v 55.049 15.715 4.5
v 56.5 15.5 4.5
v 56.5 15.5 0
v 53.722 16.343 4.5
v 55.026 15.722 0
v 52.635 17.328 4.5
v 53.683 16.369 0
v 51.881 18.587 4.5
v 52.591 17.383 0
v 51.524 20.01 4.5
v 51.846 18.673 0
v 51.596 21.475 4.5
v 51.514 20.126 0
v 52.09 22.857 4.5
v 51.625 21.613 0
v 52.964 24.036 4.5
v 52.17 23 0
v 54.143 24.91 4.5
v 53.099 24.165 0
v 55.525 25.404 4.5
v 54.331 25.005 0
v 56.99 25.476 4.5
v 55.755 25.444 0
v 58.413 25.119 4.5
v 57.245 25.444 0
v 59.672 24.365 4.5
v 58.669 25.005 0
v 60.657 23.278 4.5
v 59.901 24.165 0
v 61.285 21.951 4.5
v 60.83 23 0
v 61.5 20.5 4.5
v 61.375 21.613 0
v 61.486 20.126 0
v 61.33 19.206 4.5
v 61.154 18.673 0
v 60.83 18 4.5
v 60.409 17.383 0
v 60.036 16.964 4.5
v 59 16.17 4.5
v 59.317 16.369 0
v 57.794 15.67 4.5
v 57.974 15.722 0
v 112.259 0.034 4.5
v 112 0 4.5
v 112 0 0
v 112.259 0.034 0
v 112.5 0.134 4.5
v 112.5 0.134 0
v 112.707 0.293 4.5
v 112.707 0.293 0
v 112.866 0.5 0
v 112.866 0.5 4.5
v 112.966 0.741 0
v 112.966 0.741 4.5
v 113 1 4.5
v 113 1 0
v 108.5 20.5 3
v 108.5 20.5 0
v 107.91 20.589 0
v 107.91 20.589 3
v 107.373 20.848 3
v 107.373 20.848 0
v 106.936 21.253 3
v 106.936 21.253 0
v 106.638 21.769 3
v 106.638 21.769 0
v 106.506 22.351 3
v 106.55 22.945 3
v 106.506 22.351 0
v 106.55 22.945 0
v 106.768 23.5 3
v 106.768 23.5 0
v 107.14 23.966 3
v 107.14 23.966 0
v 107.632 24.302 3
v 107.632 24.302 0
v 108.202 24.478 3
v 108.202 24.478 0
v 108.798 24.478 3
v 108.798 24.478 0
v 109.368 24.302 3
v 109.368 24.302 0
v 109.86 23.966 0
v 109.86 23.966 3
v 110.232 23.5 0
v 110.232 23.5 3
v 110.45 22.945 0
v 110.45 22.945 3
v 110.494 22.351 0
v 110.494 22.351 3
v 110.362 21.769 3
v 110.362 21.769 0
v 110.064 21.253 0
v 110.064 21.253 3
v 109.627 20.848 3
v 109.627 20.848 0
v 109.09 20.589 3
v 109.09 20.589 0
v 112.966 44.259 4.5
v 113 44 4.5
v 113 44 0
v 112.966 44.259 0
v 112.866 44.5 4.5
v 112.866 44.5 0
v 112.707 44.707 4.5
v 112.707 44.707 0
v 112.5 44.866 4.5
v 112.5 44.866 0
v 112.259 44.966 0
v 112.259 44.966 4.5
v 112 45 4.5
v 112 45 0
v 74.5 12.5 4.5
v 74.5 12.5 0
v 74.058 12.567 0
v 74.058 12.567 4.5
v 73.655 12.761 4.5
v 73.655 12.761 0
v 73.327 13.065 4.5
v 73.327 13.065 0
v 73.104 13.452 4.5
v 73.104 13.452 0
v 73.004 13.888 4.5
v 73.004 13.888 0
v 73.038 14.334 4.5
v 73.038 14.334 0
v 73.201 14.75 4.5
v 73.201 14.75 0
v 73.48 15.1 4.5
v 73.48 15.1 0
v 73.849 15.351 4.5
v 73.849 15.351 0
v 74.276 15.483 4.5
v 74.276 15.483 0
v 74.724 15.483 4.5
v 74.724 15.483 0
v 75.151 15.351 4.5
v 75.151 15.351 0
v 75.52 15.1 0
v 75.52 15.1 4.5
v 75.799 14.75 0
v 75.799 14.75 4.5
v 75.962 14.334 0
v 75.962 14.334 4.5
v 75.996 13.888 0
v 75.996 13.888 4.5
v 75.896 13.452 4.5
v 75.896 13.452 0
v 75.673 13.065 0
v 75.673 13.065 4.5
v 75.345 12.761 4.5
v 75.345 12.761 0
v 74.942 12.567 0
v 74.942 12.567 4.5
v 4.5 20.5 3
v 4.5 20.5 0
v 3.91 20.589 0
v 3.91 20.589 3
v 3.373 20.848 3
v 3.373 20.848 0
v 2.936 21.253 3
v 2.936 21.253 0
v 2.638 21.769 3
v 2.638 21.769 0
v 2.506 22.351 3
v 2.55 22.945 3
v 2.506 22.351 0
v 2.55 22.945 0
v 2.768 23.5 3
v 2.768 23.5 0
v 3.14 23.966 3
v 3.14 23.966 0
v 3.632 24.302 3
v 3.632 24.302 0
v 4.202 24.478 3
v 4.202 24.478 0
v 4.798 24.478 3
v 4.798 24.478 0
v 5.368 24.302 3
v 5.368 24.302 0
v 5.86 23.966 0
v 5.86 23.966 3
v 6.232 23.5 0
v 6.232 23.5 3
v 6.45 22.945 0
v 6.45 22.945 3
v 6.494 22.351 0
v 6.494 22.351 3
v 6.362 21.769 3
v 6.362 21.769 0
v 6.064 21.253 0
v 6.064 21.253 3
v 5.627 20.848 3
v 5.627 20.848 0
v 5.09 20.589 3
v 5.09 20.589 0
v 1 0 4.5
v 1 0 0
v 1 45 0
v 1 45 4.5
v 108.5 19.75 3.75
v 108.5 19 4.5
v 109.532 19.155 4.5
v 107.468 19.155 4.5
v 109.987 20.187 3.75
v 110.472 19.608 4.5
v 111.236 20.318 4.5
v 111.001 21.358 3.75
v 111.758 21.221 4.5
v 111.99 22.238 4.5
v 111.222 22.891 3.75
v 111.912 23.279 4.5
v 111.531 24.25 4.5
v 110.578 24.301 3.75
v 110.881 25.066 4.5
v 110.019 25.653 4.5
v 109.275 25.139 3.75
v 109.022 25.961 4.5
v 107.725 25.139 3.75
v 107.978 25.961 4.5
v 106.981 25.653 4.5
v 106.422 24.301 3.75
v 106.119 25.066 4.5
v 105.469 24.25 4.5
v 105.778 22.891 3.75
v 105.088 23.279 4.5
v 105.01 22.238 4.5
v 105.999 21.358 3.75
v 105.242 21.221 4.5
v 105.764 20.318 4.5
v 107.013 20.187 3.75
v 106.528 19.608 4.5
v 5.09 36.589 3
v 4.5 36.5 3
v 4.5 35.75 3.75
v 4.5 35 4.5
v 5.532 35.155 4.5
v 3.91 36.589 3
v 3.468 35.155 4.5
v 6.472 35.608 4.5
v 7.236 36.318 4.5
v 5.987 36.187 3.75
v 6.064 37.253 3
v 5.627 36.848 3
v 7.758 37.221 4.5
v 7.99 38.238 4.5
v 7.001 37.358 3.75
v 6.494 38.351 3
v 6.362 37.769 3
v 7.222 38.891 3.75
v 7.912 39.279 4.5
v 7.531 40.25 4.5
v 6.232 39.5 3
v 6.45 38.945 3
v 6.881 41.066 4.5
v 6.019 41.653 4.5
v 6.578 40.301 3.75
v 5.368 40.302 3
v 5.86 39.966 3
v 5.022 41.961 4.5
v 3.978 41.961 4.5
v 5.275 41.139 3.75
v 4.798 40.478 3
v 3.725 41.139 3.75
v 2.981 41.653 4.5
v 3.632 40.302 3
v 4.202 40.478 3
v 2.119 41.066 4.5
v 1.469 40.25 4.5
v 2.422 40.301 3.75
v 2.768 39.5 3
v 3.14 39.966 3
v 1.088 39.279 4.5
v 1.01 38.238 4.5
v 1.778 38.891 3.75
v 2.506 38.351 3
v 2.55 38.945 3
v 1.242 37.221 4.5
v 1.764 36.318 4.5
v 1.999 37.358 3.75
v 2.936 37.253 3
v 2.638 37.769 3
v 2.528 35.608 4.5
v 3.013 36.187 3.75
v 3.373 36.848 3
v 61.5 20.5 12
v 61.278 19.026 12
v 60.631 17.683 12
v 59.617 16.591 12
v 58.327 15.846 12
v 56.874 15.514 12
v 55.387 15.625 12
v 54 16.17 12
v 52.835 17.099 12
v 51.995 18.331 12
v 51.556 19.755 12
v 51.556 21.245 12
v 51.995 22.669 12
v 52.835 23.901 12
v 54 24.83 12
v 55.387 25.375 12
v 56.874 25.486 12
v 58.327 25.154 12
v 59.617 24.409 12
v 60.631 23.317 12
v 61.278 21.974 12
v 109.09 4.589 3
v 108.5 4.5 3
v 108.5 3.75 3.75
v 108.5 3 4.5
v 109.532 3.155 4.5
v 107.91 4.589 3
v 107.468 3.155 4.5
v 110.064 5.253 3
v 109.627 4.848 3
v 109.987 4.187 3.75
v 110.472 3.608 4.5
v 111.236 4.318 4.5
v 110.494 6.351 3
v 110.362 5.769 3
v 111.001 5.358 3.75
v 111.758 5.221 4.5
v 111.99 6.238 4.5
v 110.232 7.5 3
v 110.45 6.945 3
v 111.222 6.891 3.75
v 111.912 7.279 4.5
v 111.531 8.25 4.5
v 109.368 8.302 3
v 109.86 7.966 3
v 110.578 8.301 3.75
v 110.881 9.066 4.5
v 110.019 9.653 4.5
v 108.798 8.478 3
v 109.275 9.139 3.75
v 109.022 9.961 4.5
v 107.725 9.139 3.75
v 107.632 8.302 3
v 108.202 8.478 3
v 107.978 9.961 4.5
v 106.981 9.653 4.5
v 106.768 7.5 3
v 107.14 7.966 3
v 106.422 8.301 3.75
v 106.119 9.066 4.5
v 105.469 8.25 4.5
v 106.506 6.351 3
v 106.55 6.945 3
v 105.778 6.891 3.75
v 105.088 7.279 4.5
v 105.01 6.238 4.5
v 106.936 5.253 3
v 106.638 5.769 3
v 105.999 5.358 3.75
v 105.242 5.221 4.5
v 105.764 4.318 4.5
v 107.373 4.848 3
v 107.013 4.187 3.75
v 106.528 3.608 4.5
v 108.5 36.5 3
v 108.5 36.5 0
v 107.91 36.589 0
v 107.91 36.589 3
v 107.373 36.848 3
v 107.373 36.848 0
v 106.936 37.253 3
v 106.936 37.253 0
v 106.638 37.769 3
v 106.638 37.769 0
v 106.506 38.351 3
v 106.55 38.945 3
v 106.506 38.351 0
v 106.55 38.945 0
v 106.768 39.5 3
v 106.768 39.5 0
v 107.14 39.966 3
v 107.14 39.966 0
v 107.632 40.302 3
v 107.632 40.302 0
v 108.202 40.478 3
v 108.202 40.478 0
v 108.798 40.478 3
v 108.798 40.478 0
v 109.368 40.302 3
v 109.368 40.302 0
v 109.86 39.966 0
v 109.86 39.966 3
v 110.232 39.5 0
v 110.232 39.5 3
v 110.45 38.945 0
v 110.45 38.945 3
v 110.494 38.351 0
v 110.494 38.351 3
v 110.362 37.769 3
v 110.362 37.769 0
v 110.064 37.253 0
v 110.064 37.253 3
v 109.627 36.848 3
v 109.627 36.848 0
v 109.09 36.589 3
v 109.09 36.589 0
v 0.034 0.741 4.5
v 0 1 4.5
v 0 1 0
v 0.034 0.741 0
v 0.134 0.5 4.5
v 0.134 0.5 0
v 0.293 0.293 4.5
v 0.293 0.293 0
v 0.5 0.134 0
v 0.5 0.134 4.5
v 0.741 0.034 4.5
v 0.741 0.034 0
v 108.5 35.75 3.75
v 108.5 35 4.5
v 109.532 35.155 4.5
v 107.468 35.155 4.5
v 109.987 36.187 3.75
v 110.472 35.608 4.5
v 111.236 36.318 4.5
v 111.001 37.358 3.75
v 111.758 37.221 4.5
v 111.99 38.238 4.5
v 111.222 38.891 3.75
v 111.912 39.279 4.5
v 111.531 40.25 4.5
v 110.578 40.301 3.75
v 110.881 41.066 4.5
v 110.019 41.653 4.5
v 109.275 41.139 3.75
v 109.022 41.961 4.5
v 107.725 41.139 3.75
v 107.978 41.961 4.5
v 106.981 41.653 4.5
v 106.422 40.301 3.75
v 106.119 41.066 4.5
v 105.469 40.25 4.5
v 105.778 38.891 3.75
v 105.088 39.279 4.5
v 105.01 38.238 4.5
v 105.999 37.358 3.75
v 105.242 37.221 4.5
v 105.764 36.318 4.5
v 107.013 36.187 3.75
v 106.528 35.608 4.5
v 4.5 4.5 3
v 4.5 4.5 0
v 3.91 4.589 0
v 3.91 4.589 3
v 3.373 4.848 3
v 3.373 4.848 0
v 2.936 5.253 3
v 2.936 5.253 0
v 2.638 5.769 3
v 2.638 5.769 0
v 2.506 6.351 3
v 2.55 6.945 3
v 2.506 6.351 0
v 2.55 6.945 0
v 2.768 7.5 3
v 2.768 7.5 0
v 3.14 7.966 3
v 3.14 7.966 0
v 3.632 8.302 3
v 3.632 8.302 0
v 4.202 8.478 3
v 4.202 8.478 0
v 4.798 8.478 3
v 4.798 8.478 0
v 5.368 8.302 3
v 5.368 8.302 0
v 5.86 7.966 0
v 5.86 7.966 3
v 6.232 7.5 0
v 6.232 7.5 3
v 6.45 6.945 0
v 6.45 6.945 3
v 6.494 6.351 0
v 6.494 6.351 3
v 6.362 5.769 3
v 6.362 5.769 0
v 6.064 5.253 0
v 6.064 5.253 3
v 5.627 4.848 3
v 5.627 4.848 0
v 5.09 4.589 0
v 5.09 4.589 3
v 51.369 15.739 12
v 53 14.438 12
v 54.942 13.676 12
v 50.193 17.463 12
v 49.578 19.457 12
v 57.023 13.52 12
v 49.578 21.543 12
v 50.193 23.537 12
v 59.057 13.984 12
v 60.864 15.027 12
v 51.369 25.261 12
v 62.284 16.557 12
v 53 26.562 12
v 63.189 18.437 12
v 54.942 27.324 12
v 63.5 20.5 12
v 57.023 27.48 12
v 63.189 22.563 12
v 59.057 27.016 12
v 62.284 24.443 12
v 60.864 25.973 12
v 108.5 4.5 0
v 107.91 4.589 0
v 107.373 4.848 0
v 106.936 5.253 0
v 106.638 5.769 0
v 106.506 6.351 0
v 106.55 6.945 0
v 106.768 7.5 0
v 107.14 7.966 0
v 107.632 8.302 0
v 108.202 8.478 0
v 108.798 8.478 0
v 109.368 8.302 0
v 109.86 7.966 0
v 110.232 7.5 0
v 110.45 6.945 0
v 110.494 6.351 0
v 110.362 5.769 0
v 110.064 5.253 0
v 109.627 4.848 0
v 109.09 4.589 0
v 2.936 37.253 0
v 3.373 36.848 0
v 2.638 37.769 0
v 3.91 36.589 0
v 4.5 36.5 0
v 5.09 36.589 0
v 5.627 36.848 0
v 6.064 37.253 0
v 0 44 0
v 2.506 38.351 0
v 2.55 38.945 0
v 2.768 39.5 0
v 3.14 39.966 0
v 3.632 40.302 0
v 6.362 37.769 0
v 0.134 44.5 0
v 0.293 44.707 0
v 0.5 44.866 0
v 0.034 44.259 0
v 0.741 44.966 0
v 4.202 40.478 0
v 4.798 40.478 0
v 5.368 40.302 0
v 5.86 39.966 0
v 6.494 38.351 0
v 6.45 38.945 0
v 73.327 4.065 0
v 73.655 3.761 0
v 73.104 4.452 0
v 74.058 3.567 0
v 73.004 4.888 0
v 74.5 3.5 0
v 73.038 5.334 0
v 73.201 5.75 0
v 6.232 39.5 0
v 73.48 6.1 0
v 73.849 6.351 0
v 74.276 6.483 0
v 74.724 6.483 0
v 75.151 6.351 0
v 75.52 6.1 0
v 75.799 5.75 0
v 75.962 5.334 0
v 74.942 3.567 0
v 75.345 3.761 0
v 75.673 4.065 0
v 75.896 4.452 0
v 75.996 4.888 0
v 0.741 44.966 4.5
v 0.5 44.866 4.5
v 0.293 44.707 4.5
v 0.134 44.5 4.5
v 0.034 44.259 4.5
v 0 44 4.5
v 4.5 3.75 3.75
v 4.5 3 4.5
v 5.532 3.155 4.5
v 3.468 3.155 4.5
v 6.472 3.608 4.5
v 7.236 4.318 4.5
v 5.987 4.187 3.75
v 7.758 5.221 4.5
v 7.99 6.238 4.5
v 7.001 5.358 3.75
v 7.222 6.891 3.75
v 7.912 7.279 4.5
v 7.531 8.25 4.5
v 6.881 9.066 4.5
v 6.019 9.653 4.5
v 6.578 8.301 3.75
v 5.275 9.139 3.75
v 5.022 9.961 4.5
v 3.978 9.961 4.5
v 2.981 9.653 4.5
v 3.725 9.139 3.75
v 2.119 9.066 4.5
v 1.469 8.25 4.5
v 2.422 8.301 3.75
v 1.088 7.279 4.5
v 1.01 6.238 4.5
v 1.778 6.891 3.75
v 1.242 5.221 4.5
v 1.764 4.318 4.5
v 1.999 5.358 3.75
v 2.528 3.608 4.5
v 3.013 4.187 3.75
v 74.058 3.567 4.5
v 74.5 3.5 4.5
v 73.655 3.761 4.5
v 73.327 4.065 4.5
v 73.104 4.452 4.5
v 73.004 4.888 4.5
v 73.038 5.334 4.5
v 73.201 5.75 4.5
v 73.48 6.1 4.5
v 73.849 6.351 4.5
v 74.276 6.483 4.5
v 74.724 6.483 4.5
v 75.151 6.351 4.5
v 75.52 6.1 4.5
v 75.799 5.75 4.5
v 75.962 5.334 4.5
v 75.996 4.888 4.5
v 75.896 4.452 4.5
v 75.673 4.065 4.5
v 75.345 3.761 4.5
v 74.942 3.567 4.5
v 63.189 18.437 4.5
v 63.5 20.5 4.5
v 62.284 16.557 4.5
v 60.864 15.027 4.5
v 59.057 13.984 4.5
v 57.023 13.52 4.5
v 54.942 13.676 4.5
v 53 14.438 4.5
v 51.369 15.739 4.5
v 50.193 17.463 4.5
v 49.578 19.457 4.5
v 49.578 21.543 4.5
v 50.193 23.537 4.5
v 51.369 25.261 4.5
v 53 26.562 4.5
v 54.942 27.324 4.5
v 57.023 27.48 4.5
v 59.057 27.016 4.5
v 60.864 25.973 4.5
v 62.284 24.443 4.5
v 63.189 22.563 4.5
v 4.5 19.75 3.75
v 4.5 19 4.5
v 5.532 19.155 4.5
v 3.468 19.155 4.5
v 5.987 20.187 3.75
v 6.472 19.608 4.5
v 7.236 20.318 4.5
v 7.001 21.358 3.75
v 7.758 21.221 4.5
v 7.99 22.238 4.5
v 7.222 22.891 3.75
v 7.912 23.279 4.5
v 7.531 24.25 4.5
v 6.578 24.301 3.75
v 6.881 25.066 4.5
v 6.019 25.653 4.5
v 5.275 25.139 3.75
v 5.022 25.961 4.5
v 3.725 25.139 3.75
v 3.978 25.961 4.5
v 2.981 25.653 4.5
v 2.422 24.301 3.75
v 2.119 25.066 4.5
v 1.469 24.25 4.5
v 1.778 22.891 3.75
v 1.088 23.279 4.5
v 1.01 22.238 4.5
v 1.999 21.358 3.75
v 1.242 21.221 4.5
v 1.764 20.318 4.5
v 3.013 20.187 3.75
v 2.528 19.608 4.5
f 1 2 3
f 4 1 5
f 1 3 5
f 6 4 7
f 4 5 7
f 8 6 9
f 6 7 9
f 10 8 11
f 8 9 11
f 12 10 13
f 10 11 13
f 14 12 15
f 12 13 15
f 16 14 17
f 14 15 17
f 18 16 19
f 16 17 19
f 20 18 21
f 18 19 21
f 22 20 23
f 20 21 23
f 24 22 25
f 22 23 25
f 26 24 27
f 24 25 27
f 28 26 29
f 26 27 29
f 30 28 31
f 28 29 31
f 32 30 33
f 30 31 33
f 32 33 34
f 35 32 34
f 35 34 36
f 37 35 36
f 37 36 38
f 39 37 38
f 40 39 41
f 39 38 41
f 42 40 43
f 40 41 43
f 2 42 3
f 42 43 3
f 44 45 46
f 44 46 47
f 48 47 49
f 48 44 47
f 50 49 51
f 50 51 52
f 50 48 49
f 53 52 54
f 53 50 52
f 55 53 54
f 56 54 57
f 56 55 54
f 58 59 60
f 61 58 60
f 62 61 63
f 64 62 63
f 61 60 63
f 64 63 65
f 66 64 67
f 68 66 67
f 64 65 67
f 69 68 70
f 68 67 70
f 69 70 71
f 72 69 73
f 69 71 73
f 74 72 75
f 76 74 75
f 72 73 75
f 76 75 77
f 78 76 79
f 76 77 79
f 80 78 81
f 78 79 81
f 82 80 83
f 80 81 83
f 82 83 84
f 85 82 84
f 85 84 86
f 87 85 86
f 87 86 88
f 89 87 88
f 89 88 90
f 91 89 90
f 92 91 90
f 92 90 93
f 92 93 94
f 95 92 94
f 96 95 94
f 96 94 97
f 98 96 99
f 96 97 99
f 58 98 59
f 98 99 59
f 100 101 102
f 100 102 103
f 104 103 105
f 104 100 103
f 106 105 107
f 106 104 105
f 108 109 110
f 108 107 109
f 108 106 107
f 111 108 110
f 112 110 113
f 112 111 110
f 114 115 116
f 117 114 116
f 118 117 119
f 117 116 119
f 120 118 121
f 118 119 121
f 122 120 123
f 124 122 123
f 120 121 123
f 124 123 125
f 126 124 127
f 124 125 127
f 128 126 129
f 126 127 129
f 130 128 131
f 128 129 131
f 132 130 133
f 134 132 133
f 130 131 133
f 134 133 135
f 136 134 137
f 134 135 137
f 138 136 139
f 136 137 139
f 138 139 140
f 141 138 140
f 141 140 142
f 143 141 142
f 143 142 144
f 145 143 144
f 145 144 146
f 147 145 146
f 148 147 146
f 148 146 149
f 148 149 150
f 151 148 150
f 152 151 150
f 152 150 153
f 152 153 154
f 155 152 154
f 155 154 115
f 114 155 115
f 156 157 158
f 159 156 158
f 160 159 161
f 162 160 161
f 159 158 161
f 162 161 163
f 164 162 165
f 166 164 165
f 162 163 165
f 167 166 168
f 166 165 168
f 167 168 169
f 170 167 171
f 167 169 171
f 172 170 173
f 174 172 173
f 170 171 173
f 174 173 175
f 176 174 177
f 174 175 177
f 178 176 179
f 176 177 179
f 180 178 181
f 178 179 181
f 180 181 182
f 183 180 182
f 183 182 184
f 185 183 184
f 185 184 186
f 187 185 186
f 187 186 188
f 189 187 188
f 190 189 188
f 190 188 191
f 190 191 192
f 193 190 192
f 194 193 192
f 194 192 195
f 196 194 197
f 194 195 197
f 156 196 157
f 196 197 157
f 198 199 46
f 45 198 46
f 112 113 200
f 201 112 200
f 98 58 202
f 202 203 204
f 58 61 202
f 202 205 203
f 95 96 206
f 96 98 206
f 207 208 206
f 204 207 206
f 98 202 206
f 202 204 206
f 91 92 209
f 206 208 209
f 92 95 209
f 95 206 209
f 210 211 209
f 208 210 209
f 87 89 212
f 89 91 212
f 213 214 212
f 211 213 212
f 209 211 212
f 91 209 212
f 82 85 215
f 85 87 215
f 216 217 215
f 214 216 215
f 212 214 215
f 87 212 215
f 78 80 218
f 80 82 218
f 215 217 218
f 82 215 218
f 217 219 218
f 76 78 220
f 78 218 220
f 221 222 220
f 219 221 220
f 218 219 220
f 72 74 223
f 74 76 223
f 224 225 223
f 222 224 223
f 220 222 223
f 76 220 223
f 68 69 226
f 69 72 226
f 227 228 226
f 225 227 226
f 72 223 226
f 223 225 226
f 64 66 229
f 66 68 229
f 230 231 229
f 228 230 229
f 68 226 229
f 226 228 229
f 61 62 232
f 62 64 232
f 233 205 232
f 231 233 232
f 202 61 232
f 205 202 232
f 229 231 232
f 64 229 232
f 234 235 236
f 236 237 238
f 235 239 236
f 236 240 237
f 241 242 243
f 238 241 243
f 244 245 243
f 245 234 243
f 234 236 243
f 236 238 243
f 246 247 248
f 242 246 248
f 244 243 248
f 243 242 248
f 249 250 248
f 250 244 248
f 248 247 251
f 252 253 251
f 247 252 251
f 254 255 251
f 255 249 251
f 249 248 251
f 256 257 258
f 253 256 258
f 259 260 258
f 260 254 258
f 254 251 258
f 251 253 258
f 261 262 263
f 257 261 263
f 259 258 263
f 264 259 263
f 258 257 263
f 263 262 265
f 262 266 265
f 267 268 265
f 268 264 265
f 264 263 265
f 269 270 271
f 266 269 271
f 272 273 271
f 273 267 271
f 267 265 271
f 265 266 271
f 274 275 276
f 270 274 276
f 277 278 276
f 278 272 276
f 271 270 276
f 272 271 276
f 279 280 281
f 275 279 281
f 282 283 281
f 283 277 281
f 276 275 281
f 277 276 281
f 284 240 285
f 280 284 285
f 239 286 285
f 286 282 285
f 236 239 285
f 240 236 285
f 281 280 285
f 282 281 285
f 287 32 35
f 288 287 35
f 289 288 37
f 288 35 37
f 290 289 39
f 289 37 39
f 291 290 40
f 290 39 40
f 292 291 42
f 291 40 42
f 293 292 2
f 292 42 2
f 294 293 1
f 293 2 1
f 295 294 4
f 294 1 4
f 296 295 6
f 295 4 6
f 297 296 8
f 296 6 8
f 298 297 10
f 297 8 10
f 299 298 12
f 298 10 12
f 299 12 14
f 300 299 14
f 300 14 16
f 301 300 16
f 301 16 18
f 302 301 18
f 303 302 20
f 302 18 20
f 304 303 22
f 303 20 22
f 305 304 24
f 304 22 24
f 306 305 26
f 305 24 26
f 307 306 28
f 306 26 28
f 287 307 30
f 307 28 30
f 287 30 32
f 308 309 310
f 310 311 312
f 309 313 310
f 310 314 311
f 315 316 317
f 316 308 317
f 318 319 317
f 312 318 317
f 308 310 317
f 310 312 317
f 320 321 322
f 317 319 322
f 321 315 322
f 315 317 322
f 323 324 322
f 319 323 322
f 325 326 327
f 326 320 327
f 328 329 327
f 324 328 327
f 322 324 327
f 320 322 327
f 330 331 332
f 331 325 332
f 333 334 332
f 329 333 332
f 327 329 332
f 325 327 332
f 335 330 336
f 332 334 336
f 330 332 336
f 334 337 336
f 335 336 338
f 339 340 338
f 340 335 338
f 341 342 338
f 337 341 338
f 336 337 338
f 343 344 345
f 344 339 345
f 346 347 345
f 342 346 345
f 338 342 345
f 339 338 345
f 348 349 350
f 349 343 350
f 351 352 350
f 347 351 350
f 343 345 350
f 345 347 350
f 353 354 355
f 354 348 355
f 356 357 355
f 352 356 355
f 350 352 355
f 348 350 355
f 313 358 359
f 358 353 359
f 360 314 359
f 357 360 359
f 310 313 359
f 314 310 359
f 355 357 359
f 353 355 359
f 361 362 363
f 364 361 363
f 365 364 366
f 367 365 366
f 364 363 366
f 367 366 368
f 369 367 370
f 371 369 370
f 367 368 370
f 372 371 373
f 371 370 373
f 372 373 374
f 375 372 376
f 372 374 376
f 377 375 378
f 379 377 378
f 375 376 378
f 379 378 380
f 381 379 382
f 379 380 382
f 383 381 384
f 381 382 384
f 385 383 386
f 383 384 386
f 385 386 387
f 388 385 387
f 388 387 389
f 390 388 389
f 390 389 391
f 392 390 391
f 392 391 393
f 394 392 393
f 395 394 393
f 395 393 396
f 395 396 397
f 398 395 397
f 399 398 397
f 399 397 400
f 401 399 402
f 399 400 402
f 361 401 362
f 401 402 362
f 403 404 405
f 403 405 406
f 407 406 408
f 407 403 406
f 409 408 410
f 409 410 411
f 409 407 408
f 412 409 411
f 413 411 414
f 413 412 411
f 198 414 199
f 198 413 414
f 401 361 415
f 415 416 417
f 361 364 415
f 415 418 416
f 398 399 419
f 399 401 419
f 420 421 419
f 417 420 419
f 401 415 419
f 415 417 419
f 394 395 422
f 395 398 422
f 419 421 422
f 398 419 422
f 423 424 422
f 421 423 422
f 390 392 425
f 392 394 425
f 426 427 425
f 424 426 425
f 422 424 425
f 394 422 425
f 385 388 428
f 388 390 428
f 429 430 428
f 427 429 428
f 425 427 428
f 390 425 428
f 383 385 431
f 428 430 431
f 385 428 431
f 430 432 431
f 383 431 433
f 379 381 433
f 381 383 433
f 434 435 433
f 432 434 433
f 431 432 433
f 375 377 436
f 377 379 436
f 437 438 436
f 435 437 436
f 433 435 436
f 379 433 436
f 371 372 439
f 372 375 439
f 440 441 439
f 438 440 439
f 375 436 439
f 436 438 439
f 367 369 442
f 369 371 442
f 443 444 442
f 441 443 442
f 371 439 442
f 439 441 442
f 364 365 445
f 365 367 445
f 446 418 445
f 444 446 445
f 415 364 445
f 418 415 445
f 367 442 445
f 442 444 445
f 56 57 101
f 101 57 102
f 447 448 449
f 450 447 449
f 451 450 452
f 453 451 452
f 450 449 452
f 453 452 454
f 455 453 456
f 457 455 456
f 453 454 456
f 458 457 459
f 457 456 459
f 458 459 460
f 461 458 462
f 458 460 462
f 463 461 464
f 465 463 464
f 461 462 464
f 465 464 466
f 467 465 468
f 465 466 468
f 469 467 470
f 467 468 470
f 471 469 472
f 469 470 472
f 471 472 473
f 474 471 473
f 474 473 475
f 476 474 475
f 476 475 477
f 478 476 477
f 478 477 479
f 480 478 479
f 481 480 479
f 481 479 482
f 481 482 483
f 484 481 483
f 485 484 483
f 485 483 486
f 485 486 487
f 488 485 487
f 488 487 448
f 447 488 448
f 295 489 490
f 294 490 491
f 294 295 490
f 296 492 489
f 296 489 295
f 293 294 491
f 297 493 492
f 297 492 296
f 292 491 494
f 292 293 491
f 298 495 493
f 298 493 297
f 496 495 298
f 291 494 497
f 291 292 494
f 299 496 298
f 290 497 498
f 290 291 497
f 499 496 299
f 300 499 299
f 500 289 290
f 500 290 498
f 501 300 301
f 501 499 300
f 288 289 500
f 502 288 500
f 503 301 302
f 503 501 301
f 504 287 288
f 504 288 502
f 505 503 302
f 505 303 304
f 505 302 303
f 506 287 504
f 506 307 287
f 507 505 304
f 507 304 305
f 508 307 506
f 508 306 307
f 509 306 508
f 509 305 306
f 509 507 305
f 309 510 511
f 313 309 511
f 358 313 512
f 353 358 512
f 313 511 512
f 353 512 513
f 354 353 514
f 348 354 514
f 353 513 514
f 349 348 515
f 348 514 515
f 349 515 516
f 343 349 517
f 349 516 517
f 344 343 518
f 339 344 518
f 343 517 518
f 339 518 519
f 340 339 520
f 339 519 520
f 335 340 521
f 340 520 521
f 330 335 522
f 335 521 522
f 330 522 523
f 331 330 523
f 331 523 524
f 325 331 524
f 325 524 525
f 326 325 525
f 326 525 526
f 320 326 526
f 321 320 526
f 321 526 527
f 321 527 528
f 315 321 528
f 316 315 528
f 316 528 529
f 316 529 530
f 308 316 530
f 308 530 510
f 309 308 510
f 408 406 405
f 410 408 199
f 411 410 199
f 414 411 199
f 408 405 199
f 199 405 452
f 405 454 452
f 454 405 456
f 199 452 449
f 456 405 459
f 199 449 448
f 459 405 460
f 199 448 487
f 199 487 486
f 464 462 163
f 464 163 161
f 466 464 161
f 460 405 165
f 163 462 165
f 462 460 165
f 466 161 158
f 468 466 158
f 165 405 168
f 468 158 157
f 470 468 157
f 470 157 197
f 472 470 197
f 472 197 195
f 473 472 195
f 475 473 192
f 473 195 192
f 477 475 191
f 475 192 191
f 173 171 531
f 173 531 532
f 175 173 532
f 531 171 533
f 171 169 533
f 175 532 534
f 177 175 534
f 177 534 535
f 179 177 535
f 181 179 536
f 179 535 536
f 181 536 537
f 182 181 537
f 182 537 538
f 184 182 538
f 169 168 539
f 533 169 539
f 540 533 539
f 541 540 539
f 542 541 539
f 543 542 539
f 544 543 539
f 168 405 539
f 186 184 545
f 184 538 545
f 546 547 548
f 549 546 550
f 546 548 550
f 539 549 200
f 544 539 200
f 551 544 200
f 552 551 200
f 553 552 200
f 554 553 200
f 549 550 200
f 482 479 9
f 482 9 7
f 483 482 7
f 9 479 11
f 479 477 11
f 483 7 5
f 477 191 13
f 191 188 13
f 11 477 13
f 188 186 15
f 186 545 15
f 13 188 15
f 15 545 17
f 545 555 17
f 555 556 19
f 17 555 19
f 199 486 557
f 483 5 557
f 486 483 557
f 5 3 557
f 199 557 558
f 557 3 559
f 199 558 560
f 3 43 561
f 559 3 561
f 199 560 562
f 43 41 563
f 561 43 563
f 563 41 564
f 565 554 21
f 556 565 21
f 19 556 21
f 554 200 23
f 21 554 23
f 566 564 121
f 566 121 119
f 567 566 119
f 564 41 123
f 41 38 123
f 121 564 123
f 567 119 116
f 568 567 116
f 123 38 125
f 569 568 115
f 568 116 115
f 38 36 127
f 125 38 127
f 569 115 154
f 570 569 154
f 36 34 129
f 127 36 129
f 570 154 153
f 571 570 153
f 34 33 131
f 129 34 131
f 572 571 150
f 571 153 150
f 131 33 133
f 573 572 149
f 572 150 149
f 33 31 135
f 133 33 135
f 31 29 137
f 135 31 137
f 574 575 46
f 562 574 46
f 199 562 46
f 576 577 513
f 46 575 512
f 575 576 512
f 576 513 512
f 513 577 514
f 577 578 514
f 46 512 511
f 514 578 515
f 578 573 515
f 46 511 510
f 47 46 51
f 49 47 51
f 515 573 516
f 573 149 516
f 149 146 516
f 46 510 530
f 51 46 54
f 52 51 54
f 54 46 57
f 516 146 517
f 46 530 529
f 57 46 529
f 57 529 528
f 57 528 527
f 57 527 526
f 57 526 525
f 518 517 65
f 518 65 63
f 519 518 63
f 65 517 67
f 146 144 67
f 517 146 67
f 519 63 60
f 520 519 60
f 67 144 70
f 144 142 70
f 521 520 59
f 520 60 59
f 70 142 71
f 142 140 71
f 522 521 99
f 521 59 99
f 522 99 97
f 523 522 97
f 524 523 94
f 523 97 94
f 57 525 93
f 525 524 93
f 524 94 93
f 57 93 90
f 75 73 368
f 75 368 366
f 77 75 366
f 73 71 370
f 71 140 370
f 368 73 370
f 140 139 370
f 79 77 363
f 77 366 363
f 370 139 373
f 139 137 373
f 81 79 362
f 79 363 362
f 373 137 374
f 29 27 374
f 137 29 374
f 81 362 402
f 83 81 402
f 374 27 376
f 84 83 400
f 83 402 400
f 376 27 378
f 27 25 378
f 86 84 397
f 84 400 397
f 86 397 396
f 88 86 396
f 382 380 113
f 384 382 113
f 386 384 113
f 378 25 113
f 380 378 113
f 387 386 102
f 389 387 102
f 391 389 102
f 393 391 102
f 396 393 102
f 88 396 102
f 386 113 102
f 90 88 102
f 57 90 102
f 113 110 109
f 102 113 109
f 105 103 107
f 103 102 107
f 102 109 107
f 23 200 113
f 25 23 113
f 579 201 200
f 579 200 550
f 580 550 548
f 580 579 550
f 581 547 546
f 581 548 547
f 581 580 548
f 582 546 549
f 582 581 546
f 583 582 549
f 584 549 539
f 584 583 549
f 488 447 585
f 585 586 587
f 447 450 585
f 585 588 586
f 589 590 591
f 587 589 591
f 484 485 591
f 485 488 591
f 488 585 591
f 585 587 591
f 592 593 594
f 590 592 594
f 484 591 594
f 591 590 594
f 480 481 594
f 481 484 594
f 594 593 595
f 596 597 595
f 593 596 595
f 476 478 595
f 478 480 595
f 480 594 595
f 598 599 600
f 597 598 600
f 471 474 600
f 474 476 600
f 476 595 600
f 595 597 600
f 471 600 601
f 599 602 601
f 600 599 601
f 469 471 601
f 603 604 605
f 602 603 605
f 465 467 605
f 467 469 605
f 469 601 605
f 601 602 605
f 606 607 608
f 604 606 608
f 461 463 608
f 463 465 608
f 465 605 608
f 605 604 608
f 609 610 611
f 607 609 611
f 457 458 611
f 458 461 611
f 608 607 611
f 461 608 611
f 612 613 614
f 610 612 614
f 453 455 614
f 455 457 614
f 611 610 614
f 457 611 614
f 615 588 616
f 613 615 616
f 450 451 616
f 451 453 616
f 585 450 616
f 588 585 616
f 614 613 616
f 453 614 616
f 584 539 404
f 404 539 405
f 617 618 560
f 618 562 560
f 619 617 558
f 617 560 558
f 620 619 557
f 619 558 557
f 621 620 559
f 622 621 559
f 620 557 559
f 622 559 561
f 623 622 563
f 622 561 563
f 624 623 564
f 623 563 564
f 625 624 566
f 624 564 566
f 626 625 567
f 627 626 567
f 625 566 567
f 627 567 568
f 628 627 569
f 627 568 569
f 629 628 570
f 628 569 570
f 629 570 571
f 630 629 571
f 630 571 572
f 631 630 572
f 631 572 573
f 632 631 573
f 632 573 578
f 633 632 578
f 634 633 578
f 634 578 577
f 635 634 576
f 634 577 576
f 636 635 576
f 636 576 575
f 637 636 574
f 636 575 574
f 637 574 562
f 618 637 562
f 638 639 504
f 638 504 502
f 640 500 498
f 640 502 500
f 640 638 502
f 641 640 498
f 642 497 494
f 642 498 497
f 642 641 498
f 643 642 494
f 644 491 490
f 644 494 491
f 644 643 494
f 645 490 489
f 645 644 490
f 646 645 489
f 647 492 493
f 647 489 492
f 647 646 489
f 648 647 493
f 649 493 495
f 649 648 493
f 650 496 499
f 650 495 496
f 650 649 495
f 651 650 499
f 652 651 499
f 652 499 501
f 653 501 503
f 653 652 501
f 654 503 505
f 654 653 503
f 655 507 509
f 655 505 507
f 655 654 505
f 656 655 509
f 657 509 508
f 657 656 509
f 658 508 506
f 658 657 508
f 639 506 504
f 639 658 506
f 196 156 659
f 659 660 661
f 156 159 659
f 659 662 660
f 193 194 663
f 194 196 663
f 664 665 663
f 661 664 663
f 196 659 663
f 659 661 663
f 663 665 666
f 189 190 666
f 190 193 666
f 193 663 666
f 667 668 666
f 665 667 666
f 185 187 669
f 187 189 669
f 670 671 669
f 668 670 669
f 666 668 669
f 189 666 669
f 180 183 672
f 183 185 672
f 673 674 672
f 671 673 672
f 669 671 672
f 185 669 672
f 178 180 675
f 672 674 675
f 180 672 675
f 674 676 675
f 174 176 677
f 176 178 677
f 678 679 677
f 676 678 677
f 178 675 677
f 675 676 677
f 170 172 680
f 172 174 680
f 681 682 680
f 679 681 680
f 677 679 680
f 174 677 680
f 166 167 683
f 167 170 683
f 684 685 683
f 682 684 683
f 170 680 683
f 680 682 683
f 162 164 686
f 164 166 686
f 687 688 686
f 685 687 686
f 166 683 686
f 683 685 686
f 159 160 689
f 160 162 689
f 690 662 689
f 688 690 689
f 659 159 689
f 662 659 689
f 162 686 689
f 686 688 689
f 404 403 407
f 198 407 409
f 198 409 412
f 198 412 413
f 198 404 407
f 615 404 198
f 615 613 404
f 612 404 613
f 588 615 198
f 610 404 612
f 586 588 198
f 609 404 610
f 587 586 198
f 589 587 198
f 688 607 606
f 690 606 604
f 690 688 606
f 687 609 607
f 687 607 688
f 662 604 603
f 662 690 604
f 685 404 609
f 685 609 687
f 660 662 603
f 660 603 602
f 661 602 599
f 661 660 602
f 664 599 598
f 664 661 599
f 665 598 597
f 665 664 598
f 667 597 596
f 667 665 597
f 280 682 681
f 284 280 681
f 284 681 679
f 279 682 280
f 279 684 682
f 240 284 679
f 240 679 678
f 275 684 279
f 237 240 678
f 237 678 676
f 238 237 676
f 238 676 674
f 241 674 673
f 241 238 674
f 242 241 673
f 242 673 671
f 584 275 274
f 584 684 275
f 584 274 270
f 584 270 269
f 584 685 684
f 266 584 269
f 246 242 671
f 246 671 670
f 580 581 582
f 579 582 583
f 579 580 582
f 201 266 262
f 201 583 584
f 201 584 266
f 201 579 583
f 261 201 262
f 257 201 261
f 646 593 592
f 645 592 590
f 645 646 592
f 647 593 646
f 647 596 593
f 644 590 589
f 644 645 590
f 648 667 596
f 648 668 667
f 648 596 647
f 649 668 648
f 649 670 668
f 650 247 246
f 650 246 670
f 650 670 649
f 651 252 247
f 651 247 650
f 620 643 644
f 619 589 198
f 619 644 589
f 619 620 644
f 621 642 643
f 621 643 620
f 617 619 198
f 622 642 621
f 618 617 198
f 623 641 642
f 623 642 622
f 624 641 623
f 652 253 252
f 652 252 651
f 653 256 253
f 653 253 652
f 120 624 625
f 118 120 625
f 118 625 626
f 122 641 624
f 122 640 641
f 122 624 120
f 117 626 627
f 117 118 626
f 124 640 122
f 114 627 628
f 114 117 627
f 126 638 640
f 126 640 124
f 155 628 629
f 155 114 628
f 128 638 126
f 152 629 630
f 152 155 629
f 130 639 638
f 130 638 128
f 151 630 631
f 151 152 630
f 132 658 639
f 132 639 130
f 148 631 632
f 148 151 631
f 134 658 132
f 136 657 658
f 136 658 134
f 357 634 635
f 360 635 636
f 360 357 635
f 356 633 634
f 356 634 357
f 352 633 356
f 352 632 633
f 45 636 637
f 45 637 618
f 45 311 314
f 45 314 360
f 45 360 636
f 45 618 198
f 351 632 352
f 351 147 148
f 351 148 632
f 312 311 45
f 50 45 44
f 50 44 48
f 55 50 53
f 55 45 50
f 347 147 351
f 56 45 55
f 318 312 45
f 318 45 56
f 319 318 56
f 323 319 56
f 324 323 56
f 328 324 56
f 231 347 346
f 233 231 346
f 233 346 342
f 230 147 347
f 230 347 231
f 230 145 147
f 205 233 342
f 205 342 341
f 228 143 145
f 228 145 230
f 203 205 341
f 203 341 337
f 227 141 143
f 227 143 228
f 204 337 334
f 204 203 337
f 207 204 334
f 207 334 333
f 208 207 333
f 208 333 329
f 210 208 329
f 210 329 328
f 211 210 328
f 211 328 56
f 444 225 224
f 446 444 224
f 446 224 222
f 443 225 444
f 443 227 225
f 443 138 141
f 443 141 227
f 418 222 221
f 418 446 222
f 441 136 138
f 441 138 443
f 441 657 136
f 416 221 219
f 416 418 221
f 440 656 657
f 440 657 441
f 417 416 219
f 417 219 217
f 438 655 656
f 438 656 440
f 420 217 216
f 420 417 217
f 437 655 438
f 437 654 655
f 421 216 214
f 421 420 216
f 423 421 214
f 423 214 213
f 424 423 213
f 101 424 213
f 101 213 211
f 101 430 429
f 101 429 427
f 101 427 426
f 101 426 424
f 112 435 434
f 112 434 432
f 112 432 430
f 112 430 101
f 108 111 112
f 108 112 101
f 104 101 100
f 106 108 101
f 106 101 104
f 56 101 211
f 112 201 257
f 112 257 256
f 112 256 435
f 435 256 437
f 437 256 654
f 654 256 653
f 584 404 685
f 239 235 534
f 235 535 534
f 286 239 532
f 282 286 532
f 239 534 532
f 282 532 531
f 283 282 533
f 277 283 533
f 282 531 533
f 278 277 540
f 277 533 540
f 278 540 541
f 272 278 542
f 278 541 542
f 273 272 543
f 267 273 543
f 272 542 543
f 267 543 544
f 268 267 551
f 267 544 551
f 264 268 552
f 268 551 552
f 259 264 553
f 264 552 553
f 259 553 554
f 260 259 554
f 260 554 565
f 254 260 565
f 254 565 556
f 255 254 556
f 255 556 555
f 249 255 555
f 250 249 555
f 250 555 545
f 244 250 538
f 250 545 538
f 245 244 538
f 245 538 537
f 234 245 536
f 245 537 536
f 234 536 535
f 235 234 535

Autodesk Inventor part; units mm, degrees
ref_plane "YZ Plane" through (0, 0, 0) normal (1, 0, 0) x (0, 1, 0)
ref_plane "XZ Plane" through (0, 0, 0) normal (0, 1, 0) x (-1, 0, 0)
ref_plane "XY Plane" through (0, 0, 0) normal (0, 0, 1) x (1, 0, 0)
sketch "Sketch1" plane through (0, 0, 0) normal (0, 0, 1) x (1, 0, 0)
  line L0 (0, 0) -> (113, 0)
  line L1 (113, 0) -> (113, 45)
  line L2 (113, 45) -> (0, 45)
  line L3 (0, 45) -> (0, 0)
  dimension "d0" = 113
  dimension "d1" = 45
extrude "Extrusion1" add sketch "Sketch1" along normal blind 4.5
sketch "Sketch2" plane through (0, 0, 4.5) normal (0, 0, 1) x (1, 0, 0)
  circle A0 centre (56.5, 20.5) radius 7
  circle A1 centre (56.5, 20.5) radius 5
  line L0 (113, 0) -> (113, 45) projected
  line L1 (0, 0) -> (113, 0) projected
  line L2 (4.5, 38.5) -> (4.5, 6.5) construction
  circle A2 centre (4.5, 38.5) radius 2
  circle A3 centre (4.5, 22.5) radius 2
  circle A4 centre (4.5, 6.5) radius 2
  line L3 (0, 45) -> (0, 0) projected
  line L4 (108.5, 38.5) -> (108.5, 6.5) construction
  circle A5 centre (108.5, 38.5) radius 2
  circle A6 centre (108.5, 22.5) radius 2
  circle A7 centre (108.5, 6.5) radius 2
  line L5 (74.5, 5) -> (74.5, 21.5) construction
  circle A8 centre (74.5, 14) radius 1.5
  circle A9 centre (74.5, 5) radius 1.5
  dimension "d4" = 14
  dimension "d5" = 10
  dimension "d6" = 56.5
  dimension "d7" = 20.5
  dimension "d8" = 4
  dimension "d9" = 4
  dimension "d10" = 4
  dimension "d11" = 4.5
  dimension "d12" = 6.5
  dimension "d13" = 16
  dimension "d14" = 16
  dimension "d15" = 4
  dimension "d16" = 4
  dimension "d17" = 4
  dimension "d18" = 6.5
  dimension "d19" = 16
  dimension "d20" = 16
  dimension "d21" = 4.5
  dimension "d23" = 3
  dimension "d24" = 3
  dimension "d25" = 5
  dimension "d26" = 9
  dimension "d27" = 38.5
  dimension "d51" = 56.5
extrude "Extrusion2" add sketch "Sketch2" along normal blind 7.5 contours A0
hole "Hole1" at (56.5, 20.5, 4.5) direction (0, 0, -1) diameter 10 end through all
hole "Hole2" at (4.5, 38.5, 4.5) at (4.5, 22.5, 4.5) at (4.5, 6.5, 4.5) at (108.5, 38.5, 4.5) at (108.5, 22.5, 4.5) at (108.5, 6.5, 4.5) direction (0, 0, -1) diameter 4 end through all countersink diameter 7 countersink angle 90
hole "Hole3" at (74.5, 14, 4.5) at (74.5, 5, 4.5) direction (0, 0, -1) diameter 3 end through all
fillet "Fillet1" radius 1 4 edges at (113, 0, 2.25) (113, 45, 2.25) (0, 45, 2.25) (0, 0, 2.25)
properties part number "HUDSON 1-05-TRUCK BOLSTER PLATE"
